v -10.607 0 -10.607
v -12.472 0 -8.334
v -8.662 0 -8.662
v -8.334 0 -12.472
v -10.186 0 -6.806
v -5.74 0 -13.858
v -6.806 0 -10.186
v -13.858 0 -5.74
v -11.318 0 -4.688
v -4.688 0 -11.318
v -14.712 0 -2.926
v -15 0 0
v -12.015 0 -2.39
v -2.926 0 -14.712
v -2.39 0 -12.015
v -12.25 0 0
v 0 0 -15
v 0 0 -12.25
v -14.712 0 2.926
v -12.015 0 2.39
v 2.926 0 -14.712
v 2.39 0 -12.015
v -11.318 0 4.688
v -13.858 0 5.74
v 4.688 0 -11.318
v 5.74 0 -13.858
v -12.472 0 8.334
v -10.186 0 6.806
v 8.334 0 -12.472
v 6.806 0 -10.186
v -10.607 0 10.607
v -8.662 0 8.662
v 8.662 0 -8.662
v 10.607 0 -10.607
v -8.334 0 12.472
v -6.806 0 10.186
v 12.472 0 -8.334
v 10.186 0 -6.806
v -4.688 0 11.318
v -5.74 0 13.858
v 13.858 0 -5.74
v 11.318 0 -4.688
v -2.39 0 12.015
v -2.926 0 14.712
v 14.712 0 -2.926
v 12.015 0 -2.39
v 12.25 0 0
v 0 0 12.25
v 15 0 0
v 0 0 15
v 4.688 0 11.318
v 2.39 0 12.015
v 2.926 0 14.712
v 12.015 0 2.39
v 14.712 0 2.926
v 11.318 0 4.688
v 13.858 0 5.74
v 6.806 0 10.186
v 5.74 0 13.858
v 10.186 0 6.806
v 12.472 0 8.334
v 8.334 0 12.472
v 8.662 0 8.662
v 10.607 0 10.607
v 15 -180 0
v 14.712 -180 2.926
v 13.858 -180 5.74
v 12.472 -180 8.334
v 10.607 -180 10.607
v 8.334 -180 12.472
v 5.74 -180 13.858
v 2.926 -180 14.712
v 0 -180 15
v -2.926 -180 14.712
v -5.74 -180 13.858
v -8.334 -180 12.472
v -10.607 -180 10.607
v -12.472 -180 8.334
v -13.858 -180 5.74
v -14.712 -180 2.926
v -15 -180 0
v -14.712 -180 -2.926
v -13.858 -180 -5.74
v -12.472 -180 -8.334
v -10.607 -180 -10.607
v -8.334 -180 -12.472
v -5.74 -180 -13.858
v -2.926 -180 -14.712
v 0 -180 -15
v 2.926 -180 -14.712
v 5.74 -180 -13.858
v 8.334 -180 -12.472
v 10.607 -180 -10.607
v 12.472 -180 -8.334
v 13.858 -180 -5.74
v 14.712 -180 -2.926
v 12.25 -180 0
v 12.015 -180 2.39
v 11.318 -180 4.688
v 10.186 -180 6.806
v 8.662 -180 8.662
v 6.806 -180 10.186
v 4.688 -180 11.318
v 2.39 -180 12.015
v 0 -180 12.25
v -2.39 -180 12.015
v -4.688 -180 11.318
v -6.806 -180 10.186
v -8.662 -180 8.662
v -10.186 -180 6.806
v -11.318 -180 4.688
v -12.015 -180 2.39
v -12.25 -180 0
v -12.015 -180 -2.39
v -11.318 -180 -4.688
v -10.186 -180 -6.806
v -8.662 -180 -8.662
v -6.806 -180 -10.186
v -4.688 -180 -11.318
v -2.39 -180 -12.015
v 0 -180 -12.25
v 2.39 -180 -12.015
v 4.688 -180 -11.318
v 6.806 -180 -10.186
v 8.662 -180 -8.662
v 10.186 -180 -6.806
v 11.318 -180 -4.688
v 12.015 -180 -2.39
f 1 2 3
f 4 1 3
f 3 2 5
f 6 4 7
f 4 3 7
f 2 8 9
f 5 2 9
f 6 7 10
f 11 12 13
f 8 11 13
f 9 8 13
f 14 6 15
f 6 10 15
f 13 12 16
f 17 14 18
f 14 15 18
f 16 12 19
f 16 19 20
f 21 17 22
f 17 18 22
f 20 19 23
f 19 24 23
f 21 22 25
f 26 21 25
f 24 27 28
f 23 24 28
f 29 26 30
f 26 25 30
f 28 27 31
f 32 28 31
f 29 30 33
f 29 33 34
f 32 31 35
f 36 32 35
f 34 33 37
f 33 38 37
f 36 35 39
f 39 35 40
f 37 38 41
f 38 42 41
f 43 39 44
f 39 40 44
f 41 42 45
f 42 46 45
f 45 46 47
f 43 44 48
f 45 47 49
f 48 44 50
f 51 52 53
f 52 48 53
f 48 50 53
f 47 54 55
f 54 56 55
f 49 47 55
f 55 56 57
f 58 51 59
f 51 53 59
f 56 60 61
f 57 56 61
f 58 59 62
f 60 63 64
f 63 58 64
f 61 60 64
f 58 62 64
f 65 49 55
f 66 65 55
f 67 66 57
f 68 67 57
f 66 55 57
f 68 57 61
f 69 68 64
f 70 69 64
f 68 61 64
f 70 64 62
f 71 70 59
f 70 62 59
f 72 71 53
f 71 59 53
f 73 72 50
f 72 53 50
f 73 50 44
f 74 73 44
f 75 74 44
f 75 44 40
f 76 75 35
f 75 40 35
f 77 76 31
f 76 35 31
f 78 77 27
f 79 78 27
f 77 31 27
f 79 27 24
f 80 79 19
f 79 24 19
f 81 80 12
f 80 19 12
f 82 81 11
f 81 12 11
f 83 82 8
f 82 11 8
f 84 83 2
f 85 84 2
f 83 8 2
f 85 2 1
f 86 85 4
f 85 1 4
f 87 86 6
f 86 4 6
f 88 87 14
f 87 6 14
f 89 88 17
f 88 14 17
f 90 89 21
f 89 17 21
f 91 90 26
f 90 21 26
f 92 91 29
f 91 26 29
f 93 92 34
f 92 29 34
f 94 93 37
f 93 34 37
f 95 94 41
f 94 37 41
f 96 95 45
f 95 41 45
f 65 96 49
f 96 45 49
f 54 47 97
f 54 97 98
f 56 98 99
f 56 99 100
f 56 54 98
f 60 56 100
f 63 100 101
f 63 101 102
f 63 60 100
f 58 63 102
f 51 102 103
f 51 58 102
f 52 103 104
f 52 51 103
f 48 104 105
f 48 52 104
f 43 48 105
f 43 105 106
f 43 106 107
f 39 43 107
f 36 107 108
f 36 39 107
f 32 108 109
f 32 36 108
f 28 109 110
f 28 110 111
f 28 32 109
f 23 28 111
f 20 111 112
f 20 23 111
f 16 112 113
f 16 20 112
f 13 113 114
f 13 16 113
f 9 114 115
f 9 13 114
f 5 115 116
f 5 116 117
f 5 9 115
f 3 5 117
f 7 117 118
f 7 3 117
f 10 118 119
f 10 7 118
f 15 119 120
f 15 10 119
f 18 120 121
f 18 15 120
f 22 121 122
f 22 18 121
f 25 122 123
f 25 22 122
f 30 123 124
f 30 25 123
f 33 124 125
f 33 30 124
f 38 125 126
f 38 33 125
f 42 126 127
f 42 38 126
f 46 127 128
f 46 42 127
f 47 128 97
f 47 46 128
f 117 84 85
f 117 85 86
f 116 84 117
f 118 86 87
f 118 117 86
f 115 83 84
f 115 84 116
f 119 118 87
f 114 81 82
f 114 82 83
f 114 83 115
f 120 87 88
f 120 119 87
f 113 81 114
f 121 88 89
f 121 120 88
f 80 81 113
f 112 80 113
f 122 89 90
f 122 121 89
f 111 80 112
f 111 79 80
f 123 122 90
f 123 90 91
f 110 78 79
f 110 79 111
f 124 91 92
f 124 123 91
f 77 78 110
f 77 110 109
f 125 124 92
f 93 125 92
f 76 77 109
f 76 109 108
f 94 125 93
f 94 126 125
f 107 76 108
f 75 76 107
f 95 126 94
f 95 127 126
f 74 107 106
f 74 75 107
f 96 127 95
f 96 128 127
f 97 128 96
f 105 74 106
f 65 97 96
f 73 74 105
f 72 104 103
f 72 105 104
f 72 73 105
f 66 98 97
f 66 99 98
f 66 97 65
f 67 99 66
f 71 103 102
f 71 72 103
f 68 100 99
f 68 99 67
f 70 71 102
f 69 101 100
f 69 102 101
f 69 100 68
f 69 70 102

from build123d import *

# Parameters (mm, degrees)
F0_R     = 15
F1_DEPTH = 180
F2_R     = 12.25
F3_DEPTH = 180
F4_R     = 12.25
F5_DEPTH = 180


# Not quite as in the source:
# - the program builds the solid bodies; features that only make, move or delete a surface that nothing else refers to are left out


with BuildPart() as f1:
    # F0 (on Front) → F1 (new body)
    with BuildSketch(Plane.XZ):
        Circle(F0_R)
    extrude(amount=F1_DEPTH)

    # F2 (on Front) → F3 (cut)
    with BuildSketch(Plane.XZ):
        Circle(F2_R)
    extrude(amount=-F3_DEPTH, mode=Mode.SUBTRACT)

    # F4 (on Front) → F5 (cut)
    with BuildSketch(Plane.XZ):
        Circle(F4_R)
    extrude(amount=F5_DEPTH, mode=Mode.SUBTRACT)


solid = f1.part
